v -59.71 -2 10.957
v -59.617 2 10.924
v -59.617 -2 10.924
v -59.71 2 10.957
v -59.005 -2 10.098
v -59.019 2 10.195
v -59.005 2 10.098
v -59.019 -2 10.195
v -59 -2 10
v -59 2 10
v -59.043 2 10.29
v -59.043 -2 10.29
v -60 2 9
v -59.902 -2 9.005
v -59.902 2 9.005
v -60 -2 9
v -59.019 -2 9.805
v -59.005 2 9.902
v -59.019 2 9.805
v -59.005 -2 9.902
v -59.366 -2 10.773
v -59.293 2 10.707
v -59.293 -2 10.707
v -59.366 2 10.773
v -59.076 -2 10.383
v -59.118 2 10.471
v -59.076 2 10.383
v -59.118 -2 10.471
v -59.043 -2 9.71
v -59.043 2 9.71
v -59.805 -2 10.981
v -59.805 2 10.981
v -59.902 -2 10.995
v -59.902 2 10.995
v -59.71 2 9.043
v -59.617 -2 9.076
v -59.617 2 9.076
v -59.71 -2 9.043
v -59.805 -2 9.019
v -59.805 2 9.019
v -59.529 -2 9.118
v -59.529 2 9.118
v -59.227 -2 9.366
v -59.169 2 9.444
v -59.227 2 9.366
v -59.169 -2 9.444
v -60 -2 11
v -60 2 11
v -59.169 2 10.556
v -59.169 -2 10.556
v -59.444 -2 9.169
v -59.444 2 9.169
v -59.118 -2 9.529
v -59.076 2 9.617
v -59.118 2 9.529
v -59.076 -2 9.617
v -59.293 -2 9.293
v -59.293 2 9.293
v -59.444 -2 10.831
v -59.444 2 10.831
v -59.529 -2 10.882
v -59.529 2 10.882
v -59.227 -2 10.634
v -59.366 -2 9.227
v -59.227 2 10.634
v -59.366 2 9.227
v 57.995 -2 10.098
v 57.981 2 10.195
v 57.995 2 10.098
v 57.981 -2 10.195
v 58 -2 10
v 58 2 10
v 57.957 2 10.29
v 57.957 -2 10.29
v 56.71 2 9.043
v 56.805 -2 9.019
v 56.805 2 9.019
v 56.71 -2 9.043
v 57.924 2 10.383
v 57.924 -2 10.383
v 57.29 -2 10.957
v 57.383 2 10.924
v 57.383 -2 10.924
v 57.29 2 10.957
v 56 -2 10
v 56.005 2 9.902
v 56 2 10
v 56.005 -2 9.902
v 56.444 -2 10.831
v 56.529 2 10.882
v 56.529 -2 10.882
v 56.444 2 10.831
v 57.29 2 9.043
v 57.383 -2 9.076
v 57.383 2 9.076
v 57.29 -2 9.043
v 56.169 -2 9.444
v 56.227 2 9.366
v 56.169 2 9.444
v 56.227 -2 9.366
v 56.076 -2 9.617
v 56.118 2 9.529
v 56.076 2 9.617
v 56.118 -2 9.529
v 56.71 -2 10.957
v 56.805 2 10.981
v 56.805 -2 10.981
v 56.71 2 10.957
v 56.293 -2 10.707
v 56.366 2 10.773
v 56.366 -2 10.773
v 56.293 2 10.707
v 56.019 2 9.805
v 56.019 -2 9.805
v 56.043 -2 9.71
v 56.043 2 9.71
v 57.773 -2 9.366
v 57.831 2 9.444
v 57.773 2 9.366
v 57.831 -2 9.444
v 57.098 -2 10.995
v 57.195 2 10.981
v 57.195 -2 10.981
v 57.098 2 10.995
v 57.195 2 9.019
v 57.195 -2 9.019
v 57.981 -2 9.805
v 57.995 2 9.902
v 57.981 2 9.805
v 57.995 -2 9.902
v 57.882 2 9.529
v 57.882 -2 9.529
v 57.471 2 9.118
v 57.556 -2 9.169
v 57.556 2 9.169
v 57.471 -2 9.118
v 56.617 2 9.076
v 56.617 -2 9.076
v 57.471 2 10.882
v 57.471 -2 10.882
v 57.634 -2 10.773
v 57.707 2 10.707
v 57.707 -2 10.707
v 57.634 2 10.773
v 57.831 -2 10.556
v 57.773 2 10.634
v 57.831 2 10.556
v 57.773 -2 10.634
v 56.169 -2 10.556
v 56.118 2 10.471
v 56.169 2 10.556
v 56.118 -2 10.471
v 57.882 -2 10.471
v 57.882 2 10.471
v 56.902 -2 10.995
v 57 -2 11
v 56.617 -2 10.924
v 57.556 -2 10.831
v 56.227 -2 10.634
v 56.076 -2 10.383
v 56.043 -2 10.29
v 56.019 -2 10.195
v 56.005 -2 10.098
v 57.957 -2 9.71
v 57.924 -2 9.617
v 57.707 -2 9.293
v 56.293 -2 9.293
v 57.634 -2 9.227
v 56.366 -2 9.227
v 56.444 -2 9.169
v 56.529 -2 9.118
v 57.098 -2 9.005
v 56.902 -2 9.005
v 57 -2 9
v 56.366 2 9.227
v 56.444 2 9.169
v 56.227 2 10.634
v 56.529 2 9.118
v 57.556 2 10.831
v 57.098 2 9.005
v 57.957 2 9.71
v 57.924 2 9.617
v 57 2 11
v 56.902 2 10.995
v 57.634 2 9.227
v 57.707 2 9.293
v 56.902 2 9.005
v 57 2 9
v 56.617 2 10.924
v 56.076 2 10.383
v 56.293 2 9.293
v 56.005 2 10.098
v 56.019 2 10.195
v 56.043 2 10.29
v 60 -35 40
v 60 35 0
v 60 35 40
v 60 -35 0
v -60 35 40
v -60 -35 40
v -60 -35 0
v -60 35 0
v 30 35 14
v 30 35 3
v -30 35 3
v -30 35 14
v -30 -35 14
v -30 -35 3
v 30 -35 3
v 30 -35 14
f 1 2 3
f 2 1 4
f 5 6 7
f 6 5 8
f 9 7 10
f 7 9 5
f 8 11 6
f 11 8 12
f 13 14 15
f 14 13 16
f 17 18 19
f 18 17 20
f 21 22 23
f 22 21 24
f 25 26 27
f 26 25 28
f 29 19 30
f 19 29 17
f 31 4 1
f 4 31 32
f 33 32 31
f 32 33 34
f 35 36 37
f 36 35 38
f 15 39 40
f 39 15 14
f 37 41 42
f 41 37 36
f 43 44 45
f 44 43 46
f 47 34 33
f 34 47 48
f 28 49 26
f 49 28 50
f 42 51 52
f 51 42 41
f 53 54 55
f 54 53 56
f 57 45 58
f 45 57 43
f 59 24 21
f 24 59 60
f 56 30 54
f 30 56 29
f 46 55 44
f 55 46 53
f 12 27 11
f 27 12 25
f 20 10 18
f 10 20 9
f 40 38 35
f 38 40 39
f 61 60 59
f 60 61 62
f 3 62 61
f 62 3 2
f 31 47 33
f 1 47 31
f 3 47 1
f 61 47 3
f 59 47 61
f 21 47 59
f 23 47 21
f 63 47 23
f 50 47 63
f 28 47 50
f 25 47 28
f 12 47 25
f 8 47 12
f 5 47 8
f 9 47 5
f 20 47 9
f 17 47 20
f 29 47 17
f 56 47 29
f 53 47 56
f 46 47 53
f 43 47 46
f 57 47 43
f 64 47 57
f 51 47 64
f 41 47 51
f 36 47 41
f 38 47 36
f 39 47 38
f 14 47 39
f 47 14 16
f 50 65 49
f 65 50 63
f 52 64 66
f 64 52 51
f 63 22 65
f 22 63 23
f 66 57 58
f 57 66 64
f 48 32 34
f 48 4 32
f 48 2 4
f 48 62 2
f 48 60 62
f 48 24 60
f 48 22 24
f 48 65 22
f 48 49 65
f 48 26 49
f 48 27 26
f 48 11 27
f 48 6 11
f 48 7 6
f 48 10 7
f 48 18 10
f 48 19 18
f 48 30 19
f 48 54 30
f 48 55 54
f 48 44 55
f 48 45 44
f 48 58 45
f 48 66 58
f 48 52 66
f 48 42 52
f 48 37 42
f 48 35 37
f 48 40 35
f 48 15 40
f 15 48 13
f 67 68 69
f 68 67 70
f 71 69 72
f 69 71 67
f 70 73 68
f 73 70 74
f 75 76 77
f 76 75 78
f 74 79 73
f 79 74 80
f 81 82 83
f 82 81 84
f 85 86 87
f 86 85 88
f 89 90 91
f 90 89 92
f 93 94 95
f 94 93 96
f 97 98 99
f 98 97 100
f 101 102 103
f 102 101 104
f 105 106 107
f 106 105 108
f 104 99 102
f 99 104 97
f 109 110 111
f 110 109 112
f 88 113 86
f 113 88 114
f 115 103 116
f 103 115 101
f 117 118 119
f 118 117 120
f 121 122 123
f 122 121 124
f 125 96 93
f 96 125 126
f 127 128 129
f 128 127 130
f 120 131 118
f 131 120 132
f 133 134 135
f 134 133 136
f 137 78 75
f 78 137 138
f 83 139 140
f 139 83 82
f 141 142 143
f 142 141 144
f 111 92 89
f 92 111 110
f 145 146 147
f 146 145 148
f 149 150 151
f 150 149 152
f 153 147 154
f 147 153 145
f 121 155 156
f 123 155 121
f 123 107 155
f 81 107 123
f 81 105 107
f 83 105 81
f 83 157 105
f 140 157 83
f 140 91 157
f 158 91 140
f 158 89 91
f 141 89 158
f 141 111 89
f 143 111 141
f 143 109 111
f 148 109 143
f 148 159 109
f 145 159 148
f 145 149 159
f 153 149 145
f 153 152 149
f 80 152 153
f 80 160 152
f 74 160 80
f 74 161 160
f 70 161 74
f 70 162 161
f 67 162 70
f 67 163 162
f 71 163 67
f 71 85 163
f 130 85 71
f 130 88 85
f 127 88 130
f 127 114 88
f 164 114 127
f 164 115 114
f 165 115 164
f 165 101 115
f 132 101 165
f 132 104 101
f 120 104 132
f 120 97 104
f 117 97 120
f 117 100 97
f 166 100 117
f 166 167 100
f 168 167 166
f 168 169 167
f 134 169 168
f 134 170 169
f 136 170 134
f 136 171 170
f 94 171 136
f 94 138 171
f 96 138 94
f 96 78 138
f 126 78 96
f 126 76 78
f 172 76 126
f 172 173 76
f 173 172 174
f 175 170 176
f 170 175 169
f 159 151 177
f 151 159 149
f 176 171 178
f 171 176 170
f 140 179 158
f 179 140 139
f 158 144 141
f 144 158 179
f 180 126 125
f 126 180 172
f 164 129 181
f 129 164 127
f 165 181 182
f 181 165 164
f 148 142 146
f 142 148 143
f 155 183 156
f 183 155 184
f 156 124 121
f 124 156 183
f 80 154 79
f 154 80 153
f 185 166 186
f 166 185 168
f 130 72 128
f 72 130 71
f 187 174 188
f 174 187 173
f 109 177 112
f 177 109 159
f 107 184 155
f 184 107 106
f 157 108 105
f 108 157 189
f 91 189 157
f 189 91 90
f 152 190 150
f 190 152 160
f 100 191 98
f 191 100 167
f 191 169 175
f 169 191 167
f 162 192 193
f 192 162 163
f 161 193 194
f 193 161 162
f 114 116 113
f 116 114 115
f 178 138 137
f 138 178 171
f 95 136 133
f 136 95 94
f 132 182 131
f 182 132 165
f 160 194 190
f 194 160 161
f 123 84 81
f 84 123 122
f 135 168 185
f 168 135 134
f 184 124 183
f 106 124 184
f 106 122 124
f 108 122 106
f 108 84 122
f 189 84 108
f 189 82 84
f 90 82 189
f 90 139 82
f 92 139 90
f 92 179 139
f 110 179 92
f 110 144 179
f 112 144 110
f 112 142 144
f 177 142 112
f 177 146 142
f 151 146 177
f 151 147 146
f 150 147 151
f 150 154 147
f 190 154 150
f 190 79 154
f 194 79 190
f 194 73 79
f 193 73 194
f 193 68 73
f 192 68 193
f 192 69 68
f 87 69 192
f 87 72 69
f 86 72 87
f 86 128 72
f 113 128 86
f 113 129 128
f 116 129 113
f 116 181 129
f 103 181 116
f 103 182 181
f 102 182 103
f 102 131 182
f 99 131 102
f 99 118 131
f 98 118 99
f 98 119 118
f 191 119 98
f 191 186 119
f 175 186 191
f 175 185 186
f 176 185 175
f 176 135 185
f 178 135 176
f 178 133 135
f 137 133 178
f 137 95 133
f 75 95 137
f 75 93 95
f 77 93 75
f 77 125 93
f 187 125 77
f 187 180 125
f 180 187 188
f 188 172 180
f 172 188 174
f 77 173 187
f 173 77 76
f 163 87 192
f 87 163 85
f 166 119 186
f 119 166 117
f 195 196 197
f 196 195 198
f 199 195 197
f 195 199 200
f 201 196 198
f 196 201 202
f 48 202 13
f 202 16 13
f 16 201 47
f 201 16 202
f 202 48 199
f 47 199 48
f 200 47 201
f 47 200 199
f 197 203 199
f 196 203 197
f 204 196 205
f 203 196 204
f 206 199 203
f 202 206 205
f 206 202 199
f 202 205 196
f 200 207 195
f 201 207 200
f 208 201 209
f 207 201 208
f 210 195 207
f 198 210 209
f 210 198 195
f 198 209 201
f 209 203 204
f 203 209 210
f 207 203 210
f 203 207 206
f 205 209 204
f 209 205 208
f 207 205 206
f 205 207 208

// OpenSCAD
// Mini horizontal gel-electrophoresis box - buffer tank
// Print orientation: tank bottom on XY plane (z = 0), opening upward

// ---------------- Parameters ----------------
outer_x      = 120;   // outer length along X (mm)
outer_y      = 70;    // outer width along Y (mm)
outer_h      = 40;    // outer height along Z (mm)

wall         = 3;     // wall thickness (mm)
floor        = 3;     // floor thickness (mm)

platform_x   = 60;    // gel tray platform length along X (mm)
platform_y   = 70;    // gel tray platform width along Y (mm)
platform_top = 13;    // gel tray platform top height (mm)

hole_d       = 2;     // electrode wire hole diameter (mm)
hole_y       = 0;     // electrode hole Y position (mm)

eps          = 0.5;   // cutter overshoot past faces (mm)

$fn = 64;

// ---------------- Derived ----------------
inner_x = outer_x - 2 * wall;      // 114 mm inner length
inner_z = outer_h - floor;         // 37 mm floor to opening

// ---------------- Model ----------------
difference() {
    // Main tank body (solid block, open top)
    translate([-outer_x / 2, -outer_y / 2, 0])
        cube([outer_x, outer_y, outer_h]);

    // Gel tray platform: spans full inner width, centred in X
    // Top at z = 13, so the platform is 10 mm above the inner floor
    translate([-platform_x / 2, -platform_y / 2, floor])
        cube([platform_x, platform_y, platform_top - floor + 1]);

    // Electrode wire holes through each end wall, along X
    for (sx = [-1, 1])
        translate([sx > 0 ? outer_x / 2 - wall : -outer_x / 2, hole_y, outer_h * 0.25])
            rotate([90, 0, 0])
                cylinder(d = hole_d, h = wall + 2 * eps, center = true);
}
